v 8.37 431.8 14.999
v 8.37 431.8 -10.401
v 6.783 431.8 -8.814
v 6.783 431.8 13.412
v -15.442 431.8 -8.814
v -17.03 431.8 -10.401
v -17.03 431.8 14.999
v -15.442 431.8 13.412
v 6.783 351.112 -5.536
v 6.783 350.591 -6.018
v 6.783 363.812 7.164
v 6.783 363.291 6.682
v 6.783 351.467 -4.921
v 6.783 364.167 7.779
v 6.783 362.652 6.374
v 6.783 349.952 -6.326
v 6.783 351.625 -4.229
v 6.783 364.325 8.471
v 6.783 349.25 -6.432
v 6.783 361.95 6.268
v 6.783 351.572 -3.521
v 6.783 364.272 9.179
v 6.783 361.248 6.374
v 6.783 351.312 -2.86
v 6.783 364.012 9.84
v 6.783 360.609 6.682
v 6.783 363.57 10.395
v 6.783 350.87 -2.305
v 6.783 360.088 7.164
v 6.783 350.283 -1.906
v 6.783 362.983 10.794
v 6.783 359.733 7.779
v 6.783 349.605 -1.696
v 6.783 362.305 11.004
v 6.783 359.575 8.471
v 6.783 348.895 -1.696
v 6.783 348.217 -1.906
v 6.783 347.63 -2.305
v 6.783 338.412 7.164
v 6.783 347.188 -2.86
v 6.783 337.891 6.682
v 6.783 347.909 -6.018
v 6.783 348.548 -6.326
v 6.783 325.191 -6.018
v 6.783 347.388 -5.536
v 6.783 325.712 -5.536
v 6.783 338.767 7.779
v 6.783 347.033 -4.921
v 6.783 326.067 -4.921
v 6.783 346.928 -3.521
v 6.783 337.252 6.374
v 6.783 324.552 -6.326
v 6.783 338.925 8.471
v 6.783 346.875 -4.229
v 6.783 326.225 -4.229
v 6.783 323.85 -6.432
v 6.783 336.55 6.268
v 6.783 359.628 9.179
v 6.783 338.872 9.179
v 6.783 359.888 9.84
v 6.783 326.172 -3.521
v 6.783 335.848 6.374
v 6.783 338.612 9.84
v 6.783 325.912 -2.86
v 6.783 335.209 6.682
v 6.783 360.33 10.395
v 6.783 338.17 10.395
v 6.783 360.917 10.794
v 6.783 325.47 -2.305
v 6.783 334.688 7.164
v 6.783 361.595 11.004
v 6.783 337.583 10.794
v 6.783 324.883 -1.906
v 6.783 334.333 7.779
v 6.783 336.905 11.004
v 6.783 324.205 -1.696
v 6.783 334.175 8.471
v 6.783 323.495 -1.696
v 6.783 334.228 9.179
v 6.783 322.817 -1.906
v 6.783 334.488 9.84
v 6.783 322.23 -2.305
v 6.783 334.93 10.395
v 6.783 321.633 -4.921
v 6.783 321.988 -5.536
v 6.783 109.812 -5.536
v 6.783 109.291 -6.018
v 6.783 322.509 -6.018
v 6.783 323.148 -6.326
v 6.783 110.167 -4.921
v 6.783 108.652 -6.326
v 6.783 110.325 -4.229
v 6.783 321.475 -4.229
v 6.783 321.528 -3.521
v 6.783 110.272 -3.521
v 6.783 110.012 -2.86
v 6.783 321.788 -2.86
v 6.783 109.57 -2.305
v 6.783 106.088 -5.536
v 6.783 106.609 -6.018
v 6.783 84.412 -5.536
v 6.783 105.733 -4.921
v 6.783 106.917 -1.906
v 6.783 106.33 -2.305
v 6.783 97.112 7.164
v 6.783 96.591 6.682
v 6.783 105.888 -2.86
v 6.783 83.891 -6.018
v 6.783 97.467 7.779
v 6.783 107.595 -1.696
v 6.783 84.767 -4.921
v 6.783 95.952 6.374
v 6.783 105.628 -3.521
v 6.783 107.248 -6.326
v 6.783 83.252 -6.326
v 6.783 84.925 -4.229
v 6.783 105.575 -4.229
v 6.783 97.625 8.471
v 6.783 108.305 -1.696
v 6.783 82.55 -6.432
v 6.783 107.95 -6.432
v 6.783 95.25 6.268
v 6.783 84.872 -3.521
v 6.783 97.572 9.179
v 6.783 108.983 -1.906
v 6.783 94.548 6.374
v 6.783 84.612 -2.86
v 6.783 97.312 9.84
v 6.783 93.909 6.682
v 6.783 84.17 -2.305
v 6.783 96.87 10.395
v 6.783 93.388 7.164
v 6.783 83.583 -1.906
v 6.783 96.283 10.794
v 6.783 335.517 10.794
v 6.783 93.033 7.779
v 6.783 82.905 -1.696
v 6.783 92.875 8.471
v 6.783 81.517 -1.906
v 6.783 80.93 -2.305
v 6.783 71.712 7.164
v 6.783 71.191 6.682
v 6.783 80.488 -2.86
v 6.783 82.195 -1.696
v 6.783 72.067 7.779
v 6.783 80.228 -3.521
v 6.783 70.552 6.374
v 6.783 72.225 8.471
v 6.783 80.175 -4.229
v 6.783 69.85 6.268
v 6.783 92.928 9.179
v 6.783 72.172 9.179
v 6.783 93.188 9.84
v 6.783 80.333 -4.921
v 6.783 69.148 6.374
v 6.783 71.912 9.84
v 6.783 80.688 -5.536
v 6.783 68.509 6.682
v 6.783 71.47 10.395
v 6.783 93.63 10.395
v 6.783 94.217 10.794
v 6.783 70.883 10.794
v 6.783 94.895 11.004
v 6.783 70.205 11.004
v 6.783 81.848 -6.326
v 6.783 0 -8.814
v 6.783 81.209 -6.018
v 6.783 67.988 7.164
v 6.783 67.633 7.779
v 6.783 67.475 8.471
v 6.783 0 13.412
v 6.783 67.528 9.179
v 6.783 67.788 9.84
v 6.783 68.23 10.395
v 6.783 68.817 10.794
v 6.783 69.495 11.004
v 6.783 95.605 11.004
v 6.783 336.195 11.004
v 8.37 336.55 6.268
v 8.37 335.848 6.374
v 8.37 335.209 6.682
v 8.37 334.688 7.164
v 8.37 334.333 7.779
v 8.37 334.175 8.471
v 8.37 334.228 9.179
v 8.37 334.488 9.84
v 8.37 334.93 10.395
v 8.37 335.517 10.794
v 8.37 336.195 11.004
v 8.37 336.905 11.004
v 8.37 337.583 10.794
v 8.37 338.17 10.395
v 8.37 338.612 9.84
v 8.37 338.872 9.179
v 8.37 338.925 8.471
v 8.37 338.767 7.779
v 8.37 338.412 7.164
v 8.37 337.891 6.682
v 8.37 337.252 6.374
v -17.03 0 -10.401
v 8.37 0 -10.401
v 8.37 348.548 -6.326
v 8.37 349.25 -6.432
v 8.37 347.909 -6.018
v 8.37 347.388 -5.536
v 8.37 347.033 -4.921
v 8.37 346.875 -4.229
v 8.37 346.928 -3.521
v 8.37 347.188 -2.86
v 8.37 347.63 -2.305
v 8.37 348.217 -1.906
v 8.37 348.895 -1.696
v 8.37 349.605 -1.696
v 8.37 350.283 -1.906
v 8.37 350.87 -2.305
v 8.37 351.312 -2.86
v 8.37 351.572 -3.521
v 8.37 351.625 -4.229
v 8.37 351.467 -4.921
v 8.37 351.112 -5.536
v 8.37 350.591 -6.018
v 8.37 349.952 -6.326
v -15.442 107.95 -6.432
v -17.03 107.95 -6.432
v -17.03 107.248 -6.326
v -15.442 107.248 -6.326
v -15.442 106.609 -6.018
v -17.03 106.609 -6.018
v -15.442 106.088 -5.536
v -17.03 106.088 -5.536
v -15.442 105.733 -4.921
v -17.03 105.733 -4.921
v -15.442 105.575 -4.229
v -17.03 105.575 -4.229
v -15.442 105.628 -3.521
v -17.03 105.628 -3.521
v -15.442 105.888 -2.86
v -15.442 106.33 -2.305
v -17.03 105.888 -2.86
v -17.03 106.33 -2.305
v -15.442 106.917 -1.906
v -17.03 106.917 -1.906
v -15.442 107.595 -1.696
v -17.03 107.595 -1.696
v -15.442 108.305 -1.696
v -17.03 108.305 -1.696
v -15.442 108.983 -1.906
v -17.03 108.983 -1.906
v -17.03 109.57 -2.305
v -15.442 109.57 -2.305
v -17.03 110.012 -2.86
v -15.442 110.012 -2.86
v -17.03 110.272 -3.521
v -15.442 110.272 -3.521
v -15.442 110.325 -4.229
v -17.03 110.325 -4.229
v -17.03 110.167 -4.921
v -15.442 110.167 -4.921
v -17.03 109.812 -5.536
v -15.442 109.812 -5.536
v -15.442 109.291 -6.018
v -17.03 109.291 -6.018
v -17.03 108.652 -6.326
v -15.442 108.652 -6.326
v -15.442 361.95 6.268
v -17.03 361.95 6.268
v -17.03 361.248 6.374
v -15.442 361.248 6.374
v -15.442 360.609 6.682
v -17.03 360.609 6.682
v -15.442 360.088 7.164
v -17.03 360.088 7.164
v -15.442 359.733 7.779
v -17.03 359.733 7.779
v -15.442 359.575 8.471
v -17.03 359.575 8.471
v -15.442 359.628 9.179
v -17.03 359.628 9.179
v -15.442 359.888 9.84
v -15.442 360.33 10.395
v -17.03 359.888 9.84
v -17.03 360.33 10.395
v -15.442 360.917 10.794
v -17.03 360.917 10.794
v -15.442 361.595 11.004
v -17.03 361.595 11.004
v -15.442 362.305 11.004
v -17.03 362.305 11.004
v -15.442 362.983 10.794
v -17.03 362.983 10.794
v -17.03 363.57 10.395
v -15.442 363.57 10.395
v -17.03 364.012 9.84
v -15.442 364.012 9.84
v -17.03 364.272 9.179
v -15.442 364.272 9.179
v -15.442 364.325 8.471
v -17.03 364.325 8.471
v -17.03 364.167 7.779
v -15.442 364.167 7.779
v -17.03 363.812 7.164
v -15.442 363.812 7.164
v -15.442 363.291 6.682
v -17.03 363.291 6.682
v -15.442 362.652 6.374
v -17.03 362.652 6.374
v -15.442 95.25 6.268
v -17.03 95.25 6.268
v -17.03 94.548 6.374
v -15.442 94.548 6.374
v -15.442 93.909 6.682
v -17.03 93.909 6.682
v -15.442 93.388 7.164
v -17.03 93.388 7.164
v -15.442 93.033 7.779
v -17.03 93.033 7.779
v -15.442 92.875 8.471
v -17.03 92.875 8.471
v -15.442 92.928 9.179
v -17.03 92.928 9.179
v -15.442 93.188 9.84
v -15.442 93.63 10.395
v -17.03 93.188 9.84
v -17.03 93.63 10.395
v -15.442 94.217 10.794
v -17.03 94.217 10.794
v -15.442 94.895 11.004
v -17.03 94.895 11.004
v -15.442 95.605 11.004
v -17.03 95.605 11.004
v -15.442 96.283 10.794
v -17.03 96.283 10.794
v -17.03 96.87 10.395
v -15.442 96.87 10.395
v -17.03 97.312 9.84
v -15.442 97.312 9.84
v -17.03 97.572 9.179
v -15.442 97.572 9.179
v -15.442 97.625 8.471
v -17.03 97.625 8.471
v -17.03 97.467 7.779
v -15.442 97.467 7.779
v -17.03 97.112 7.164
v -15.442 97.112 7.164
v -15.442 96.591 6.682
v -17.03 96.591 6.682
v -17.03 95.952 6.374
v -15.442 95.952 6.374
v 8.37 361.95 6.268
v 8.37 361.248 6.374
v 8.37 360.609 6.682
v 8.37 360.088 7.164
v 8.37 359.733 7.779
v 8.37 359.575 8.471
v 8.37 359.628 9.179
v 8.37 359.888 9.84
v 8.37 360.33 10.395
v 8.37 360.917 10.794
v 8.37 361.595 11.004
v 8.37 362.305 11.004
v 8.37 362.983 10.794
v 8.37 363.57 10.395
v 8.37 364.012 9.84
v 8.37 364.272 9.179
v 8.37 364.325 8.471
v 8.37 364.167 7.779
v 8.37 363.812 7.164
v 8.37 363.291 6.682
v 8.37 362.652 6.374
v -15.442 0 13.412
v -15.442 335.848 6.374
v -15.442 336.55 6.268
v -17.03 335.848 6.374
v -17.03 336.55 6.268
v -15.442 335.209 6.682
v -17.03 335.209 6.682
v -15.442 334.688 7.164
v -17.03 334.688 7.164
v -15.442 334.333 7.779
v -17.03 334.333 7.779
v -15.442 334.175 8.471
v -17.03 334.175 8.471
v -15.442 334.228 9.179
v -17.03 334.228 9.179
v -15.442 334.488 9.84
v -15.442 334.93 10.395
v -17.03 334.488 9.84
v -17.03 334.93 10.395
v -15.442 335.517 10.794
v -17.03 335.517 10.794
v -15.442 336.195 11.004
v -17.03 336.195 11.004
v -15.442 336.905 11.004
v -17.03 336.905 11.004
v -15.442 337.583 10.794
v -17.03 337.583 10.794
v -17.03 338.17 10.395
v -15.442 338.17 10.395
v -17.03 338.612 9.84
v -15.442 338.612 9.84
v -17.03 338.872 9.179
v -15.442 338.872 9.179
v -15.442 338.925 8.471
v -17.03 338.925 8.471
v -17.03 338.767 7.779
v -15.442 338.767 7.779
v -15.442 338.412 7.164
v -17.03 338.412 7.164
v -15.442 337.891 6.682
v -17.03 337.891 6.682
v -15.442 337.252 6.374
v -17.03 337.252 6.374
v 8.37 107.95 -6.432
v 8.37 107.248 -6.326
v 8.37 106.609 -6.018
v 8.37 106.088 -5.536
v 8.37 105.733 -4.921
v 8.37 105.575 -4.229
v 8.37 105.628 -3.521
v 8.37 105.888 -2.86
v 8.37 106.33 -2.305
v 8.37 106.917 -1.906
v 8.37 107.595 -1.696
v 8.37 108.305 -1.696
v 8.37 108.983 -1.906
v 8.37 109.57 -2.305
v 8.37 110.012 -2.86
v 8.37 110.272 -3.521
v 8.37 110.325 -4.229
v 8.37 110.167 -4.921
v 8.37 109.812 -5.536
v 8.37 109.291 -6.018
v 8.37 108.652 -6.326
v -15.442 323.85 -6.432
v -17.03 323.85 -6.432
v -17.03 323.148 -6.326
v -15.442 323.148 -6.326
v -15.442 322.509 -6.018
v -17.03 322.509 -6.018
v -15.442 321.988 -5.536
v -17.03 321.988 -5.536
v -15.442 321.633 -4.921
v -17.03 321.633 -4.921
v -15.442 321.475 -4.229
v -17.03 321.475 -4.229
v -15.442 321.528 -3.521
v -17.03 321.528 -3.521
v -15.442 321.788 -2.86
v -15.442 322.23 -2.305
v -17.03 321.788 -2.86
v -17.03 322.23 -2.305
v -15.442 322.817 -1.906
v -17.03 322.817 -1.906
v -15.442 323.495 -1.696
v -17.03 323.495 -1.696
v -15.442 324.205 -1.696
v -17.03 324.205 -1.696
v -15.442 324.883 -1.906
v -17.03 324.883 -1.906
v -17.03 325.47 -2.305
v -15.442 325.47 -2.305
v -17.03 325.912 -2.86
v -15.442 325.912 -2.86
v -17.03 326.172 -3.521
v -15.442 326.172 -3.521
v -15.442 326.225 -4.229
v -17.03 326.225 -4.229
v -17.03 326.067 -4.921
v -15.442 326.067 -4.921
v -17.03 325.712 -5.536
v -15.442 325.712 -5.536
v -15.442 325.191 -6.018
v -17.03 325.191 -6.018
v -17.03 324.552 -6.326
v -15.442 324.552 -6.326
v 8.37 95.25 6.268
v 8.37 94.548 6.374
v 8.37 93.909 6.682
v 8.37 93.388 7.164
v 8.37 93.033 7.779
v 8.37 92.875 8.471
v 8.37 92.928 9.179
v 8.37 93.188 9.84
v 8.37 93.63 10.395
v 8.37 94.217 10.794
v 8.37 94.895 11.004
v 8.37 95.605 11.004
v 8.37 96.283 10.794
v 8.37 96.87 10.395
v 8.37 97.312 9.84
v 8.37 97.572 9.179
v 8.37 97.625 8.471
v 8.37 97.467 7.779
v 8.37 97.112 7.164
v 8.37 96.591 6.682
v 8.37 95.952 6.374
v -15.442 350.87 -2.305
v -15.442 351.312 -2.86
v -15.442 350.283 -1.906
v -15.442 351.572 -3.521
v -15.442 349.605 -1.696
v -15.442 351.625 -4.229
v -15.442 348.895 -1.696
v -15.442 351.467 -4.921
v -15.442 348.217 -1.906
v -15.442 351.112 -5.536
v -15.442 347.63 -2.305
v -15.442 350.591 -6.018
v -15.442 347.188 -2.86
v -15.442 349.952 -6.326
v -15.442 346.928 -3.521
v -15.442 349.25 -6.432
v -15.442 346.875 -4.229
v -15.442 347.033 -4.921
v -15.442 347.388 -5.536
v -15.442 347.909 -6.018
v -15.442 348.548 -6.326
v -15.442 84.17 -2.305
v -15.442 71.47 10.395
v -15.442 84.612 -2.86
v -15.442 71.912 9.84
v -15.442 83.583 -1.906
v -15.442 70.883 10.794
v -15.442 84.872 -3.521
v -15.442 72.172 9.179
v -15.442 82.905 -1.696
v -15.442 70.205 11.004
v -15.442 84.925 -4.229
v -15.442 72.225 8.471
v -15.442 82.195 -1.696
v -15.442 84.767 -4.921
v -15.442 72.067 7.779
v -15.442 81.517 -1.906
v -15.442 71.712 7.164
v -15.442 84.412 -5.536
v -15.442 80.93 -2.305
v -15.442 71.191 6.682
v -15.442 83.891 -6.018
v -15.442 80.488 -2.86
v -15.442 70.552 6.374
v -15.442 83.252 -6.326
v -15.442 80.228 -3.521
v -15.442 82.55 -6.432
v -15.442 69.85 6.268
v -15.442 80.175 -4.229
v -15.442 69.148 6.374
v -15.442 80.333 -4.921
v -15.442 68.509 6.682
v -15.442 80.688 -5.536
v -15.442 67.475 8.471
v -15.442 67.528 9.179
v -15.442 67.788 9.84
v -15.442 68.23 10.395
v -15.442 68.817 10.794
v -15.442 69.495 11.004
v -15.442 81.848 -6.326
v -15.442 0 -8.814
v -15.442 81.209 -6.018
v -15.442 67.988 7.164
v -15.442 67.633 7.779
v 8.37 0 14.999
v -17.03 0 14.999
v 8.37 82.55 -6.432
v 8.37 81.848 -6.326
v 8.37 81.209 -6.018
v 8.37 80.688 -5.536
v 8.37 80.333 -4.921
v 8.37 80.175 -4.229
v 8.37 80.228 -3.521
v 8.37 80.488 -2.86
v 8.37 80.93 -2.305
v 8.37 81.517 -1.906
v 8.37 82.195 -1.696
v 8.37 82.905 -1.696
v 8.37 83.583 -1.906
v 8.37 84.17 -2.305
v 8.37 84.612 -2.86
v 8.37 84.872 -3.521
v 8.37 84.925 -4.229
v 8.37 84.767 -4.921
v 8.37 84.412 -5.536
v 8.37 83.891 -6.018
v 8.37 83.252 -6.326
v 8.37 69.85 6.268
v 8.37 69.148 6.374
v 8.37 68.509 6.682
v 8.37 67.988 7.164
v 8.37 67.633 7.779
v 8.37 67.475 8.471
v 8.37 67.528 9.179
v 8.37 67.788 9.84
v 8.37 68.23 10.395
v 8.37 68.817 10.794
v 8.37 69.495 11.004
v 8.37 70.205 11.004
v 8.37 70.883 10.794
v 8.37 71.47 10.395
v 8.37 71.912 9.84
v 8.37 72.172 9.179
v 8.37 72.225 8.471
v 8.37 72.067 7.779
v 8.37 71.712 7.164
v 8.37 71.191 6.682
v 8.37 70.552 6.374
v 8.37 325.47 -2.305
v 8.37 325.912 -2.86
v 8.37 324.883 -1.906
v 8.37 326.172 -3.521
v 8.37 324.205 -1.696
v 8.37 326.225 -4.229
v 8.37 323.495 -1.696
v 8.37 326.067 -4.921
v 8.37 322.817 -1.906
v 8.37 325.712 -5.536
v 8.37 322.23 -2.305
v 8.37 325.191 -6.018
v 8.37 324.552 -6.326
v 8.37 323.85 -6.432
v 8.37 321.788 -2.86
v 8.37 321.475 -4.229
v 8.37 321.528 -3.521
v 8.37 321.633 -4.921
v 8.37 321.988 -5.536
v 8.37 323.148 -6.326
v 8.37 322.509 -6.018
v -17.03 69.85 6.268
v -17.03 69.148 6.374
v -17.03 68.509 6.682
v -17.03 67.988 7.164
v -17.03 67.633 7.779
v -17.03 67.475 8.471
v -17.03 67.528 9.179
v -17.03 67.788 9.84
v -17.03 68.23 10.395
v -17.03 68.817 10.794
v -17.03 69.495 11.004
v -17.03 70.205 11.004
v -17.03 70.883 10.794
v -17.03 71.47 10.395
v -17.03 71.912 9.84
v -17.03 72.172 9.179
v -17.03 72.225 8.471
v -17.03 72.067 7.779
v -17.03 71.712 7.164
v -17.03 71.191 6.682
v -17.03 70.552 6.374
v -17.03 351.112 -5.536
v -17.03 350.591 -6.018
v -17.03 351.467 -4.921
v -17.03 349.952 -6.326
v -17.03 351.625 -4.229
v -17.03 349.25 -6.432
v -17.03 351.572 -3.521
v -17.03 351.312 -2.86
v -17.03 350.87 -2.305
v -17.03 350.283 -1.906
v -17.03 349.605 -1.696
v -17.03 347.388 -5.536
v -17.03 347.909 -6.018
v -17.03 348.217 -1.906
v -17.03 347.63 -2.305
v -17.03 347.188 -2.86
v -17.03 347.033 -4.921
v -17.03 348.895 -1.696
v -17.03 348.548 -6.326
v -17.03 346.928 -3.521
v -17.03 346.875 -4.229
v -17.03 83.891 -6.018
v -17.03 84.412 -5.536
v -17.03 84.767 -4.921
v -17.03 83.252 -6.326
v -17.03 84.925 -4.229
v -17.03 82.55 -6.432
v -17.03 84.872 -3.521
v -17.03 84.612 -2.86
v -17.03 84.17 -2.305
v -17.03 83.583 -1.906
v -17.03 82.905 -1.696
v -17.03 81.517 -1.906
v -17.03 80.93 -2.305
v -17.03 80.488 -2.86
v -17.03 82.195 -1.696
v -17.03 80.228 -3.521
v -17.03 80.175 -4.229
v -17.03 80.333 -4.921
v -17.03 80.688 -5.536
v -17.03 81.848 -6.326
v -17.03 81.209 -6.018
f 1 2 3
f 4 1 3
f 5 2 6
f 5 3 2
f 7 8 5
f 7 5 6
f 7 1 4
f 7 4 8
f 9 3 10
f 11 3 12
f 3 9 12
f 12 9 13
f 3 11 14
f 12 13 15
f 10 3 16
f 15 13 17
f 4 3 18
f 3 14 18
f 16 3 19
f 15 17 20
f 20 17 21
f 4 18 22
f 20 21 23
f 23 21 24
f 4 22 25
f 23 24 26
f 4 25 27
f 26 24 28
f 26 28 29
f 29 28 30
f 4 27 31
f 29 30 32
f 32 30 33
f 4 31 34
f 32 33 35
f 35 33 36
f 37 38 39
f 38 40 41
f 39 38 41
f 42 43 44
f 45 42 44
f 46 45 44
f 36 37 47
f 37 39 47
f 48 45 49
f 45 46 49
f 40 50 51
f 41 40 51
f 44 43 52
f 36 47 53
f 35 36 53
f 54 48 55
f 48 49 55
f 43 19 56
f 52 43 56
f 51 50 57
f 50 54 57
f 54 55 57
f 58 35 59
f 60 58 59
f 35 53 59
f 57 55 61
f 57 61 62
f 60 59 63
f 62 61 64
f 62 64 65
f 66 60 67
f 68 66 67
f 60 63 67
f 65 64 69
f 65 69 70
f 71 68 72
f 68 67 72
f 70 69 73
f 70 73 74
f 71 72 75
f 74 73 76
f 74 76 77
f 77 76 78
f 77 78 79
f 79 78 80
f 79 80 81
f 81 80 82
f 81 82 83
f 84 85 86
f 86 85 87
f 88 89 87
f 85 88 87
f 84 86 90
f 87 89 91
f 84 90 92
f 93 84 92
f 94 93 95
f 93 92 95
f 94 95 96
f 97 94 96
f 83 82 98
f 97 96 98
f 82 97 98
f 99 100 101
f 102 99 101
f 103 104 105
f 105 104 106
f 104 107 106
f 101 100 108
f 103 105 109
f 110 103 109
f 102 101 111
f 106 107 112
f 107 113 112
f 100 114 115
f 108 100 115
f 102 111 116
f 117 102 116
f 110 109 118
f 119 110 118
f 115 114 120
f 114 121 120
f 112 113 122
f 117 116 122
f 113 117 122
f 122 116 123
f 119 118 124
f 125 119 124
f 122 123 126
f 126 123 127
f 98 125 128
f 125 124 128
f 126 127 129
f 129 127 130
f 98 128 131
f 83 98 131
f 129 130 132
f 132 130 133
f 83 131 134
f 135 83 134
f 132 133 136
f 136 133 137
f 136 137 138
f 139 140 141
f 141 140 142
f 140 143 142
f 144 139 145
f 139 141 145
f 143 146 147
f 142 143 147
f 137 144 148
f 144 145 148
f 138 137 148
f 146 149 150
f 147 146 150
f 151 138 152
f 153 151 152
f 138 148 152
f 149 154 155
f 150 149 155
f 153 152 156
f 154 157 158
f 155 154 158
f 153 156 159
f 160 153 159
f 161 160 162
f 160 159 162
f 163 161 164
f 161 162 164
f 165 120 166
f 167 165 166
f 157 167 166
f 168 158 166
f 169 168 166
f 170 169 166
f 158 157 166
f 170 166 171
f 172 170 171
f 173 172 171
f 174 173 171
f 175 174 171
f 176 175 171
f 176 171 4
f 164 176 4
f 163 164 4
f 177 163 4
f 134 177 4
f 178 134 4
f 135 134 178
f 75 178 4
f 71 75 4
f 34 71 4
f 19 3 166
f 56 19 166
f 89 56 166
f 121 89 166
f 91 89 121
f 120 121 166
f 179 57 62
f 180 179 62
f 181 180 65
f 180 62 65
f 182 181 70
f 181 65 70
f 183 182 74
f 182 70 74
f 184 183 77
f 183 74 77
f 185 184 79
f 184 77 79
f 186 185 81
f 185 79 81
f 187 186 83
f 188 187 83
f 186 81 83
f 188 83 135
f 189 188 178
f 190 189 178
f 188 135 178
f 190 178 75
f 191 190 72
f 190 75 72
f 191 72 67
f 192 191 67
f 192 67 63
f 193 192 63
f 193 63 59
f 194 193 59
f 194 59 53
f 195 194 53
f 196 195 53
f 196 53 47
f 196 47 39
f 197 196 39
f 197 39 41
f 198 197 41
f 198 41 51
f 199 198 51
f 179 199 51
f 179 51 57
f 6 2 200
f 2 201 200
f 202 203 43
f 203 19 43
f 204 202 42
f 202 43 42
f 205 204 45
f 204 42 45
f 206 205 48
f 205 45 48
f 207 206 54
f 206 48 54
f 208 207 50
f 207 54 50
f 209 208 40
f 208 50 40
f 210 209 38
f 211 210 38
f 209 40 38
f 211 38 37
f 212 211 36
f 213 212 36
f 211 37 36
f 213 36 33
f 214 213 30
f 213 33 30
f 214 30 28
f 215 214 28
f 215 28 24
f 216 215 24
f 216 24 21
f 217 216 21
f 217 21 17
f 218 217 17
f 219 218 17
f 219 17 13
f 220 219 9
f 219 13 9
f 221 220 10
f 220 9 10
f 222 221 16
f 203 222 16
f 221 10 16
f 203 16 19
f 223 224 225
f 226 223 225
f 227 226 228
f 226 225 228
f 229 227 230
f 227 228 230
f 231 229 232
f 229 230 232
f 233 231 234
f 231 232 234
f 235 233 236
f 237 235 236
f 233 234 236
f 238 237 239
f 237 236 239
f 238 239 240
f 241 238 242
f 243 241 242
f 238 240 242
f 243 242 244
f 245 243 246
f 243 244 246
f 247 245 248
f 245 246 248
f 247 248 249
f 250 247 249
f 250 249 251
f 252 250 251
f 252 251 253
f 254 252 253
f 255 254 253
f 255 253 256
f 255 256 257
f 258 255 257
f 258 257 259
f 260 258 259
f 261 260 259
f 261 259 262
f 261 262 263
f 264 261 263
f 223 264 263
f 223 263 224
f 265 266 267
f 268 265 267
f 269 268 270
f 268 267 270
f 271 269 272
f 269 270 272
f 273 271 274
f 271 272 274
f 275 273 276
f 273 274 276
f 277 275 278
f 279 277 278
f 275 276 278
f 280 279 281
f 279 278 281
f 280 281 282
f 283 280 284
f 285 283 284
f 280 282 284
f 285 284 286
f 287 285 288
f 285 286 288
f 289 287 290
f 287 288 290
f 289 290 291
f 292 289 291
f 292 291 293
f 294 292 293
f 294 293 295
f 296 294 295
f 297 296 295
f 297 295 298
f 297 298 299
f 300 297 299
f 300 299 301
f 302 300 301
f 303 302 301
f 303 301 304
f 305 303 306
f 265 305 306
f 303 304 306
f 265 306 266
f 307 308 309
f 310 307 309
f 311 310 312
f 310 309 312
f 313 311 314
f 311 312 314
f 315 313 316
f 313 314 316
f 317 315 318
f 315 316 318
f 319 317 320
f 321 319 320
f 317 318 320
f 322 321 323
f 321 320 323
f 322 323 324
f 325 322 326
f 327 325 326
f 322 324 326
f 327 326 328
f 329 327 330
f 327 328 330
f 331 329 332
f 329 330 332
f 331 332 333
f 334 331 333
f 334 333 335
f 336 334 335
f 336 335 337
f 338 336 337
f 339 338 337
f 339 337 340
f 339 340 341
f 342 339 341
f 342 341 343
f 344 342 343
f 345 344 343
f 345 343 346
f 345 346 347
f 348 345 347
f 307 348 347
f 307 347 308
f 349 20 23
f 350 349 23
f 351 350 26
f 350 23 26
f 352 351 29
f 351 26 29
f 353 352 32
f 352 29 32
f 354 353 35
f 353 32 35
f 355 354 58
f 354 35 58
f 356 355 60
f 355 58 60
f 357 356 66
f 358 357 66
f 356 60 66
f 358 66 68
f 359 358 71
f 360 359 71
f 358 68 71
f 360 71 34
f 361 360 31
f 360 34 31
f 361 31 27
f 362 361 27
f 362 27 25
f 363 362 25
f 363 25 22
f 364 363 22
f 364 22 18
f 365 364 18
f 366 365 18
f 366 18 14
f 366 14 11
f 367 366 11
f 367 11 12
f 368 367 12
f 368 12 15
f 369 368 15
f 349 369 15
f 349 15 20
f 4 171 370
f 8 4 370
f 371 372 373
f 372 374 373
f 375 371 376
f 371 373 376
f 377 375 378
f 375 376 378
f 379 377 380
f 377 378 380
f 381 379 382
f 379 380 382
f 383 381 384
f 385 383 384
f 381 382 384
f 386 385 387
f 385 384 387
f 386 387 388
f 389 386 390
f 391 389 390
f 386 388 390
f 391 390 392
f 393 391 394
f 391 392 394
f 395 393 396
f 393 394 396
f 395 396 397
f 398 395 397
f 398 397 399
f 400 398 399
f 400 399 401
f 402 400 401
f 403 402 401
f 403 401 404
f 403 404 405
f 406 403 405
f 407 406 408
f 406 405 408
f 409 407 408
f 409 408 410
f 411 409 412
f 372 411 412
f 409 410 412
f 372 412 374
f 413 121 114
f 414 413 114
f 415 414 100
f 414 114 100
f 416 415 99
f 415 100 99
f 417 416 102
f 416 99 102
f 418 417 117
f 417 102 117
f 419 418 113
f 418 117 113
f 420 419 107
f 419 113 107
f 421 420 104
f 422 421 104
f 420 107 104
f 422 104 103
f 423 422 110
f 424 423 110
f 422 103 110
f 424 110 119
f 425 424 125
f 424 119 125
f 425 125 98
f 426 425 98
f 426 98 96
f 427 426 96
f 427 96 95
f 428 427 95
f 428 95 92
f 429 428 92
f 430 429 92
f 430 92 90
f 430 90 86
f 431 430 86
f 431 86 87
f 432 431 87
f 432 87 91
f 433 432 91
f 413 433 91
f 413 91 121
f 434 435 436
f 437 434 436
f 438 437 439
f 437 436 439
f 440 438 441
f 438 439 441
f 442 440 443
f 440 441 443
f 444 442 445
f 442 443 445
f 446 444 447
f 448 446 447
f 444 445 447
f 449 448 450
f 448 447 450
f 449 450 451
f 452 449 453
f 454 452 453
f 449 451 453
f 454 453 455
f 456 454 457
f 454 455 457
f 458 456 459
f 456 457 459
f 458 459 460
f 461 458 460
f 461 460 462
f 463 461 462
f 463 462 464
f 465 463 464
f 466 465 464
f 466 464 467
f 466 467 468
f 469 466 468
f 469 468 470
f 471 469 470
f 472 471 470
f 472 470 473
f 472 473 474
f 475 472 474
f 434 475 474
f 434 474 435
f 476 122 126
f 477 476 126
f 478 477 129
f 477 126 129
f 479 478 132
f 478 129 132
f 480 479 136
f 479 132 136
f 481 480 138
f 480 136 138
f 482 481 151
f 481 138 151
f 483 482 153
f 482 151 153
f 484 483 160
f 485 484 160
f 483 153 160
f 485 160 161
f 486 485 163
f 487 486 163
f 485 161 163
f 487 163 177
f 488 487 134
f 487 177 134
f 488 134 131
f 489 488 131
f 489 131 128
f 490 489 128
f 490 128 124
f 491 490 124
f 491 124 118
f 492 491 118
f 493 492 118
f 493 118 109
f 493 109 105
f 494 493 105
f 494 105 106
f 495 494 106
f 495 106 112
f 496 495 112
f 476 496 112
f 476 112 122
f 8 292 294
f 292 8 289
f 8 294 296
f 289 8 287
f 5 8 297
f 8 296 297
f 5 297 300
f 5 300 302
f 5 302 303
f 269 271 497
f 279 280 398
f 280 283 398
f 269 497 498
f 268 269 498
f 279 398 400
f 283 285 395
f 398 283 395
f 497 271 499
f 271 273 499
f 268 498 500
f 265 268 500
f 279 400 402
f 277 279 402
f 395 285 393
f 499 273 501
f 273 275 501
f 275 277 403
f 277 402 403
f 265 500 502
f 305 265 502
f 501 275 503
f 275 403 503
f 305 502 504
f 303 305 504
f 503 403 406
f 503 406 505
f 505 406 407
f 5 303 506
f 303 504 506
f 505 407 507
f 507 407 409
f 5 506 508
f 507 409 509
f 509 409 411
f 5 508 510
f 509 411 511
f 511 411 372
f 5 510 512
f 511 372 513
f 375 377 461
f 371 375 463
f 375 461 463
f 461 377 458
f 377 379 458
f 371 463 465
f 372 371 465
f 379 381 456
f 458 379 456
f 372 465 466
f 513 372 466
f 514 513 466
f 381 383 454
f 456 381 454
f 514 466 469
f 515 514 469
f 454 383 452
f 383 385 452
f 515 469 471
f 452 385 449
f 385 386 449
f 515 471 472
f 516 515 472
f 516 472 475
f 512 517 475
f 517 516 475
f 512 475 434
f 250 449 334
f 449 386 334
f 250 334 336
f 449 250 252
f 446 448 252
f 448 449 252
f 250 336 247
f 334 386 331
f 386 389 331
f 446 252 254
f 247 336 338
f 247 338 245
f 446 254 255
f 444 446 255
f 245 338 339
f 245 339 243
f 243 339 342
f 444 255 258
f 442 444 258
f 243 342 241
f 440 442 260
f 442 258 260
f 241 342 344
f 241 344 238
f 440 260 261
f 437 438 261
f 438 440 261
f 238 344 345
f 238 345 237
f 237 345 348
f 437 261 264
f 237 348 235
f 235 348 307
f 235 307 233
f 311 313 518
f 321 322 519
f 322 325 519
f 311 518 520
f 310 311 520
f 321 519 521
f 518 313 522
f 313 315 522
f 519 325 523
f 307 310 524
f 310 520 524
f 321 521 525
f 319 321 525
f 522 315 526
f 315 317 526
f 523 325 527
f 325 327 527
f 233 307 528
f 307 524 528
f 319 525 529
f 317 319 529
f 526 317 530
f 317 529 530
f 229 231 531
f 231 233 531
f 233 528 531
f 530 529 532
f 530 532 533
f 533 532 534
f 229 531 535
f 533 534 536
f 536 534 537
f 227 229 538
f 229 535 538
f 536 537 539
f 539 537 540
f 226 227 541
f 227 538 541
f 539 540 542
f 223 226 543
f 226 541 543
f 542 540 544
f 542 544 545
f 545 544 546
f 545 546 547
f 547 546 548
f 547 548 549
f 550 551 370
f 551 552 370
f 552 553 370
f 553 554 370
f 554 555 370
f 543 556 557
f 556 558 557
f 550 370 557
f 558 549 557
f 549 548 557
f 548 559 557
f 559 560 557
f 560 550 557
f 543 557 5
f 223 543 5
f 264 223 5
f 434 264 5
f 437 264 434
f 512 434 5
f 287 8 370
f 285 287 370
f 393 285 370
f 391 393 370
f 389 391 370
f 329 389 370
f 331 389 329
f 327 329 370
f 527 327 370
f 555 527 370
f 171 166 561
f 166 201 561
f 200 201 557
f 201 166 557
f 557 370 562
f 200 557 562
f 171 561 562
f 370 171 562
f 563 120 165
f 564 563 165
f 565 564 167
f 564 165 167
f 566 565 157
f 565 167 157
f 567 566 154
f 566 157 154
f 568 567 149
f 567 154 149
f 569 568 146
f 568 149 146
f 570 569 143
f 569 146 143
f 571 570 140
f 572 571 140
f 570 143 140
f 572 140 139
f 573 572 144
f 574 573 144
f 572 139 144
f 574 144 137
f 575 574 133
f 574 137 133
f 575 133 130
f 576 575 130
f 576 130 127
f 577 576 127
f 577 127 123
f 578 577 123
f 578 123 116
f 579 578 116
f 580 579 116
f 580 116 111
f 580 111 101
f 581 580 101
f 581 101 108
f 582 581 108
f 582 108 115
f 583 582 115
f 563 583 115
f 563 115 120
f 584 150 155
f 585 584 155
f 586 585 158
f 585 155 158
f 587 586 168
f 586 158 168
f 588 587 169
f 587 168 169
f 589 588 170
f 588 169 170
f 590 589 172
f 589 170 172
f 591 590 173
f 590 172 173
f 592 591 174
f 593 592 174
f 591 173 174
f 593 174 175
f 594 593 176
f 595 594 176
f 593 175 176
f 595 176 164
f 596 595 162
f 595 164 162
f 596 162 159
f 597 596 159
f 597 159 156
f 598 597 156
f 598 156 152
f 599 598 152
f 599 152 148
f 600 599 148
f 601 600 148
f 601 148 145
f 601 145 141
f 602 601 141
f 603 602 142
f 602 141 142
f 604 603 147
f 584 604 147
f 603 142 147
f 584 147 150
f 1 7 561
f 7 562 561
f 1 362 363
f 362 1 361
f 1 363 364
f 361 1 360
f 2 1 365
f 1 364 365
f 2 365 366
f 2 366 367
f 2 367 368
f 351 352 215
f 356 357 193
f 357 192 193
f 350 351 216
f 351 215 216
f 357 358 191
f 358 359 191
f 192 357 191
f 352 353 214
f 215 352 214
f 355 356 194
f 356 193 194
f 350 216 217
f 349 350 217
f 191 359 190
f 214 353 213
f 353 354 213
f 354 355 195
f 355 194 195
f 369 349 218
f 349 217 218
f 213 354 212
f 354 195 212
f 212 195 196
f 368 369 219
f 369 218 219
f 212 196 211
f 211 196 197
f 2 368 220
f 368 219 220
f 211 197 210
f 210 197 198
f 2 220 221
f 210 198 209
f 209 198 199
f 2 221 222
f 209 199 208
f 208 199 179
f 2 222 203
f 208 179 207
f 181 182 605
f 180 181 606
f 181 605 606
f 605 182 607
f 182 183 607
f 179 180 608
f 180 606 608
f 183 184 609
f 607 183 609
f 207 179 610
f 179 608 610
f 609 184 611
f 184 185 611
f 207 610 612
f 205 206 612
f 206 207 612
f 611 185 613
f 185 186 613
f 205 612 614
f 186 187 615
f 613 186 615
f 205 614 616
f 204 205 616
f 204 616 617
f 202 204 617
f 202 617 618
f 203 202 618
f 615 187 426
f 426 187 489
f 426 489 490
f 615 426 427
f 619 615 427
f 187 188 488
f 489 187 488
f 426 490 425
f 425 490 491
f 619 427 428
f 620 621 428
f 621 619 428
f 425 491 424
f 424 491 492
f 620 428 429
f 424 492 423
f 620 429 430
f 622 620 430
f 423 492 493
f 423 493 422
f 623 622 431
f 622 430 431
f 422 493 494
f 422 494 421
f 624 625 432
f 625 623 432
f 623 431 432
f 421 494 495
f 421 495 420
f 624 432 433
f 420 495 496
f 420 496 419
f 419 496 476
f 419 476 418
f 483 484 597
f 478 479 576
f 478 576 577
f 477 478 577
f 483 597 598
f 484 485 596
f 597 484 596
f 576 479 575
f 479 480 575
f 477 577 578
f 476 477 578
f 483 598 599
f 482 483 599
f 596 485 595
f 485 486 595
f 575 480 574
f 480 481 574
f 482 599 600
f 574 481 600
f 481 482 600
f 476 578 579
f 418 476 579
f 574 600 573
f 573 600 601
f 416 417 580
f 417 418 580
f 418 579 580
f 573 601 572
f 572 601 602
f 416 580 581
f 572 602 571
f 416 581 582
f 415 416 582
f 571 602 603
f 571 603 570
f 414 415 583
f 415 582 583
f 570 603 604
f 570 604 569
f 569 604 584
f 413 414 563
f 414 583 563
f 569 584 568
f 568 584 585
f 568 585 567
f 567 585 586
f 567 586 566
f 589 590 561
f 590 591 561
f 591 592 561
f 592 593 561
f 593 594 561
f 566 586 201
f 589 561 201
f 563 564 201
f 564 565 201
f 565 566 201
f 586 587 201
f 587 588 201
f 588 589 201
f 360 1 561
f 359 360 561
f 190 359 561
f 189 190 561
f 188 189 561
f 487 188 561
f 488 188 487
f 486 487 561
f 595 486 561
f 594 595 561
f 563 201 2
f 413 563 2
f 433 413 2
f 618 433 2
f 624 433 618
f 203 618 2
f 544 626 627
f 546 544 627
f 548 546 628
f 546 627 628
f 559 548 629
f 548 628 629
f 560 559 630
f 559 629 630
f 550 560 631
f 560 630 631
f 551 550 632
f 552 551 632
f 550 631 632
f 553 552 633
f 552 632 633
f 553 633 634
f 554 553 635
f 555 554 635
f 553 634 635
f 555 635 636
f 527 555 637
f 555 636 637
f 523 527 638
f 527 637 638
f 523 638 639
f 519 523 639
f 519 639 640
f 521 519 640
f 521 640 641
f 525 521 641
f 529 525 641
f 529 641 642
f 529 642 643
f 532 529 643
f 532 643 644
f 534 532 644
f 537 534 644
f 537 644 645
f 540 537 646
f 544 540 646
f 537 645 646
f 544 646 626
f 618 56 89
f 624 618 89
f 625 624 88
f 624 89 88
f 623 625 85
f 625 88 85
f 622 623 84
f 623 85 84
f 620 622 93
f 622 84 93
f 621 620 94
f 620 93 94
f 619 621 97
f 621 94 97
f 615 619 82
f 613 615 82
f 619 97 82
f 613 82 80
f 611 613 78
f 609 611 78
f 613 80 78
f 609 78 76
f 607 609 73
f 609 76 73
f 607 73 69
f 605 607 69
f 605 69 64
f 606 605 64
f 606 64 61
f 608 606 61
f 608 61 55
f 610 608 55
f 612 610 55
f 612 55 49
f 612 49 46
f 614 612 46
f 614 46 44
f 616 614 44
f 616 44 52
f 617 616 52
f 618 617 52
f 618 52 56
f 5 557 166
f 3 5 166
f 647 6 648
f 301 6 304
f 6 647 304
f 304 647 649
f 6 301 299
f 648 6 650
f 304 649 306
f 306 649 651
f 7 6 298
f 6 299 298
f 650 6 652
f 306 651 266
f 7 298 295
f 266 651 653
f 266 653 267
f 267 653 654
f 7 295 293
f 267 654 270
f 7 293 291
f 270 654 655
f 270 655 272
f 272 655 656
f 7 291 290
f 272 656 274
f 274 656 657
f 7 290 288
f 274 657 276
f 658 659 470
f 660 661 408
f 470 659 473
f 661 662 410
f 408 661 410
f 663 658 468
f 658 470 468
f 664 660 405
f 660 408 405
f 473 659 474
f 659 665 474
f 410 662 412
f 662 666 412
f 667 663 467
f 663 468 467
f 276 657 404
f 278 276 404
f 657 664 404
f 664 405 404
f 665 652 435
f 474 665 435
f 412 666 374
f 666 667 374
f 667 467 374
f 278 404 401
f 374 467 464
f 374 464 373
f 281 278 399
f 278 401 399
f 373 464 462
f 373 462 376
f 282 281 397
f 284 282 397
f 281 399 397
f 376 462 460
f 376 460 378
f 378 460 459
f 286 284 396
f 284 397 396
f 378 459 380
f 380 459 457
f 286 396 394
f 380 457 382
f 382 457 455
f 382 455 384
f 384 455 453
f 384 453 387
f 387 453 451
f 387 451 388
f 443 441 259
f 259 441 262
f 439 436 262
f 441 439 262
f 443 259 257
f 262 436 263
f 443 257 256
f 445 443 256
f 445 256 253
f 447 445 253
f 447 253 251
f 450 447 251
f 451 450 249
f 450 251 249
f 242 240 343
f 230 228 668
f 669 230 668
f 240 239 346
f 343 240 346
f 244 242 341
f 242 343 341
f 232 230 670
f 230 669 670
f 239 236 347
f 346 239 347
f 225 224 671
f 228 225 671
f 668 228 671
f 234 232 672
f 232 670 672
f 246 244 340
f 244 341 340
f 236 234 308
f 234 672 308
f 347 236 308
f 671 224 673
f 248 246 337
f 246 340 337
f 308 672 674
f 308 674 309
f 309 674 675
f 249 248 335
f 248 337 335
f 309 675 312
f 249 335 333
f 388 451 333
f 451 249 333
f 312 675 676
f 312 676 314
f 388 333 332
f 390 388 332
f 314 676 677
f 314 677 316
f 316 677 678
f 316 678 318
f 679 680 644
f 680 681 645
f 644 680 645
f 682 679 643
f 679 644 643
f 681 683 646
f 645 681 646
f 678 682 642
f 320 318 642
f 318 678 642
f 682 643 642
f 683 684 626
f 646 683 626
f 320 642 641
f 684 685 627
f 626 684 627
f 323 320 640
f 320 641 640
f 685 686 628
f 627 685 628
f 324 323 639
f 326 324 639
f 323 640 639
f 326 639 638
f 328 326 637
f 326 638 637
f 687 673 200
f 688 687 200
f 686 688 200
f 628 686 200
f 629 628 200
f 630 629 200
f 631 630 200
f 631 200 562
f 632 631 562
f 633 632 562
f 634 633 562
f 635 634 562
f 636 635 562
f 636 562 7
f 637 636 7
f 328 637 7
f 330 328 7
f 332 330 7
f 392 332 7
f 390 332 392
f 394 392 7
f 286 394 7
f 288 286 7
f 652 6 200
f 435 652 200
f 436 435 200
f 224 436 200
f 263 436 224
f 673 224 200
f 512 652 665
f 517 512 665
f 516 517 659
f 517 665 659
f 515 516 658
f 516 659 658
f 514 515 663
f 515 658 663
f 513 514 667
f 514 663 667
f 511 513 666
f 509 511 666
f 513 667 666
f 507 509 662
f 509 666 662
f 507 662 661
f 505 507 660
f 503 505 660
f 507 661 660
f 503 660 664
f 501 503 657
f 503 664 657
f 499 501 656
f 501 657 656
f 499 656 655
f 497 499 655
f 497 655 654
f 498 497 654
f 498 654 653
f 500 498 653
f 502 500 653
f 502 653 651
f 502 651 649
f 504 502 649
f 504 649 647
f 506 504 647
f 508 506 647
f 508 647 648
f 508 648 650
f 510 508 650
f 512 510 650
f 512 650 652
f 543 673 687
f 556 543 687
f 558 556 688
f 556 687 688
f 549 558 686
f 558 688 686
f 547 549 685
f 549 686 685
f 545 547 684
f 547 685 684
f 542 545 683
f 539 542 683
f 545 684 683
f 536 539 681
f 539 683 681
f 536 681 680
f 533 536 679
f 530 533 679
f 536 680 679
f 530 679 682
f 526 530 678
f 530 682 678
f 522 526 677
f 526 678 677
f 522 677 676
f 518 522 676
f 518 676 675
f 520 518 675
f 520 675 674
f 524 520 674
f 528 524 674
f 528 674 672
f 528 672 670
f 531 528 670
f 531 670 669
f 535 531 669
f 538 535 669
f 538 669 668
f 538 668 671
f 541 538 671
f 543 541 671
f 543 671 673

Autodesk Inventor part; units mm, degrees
ref_plane "YZ Plane" through (0, 0, 0) normal (1, 0, 0) x (0, 1, 0)
ref_plane "XZ Plane" through (0, 0, 0) normal (0, 1, 0) x (-1, 0, 0)
ref_plane "XY Plane" through (0, 0, 0) normal (0, 0, 1) x (1, 0, 0)
sketch "Sketch1" plane through (0, 0, 0) normal (0, 1, 0) x (-1, 0, 0)
  line L0 (17.0295, 14.999) -> (-8.3705, 14.999)
  line L1 (-8.3705, 14.999) -> (-8.3705, -10.401)
  line L2 (-8.3705, -10.401) -> (17.0295, -10.401)
  line L3 (17.0295, -10.401) -> (17.0295, 14.999)
  line L4 (15.442, -8.8135) -> (-6.783, -8.8135)
  line L5 (-6.783, -8.8135) -> (-6.783, 13.4115)
  line L6 (-6.783, 13.4115) -> (15.442, 13.4115)
  line L7 (15.442, 13.4115) -> (15.442, -8.8135)
  point P0 (0, 0)
  dimension "d0" = 25.4
  dimension "d1" = 25.4
  dimension "d4" = 1.5875
  dimension "d5" = 1.5875
  dimension "d6" = 1.5875
  dimension "d7" = 1.5875
extrude "Extrusion2" add sketch "Sketch1" along normal blind 431.8
sketch "Sketch3" plane through (8.3705, 0, 14.999) normal (1, 0, 0) x (0, 0, -1)
  line L0 (25.4, 0) -> (25.4, 431.8) projected
  line L1 (0, 431.8) -> (25.4, 431.8) projected
  line L2 (0, 0) -> (25.4, 0) projected
  point P0 (14.999, 0)
  point P1 (19.05, 349.25)
  point P2 (19.05, 82.55)
  dimension "d19" = 6.35
  dimension "d20" = 82.55
  dimension "d21" = 6.35
  dimension "d22" = 82.55
hole "Hole2" at (8.3705, 349.25, -4.051) at (8.3705, 82.55, -4.051) direction (-1, 0, 0) diameter 4.7625 depth 25.4 tip angle 118.188
sketch "Sketch4" plane through (8.3705, 0, 14.999) normal (1, 0, 0) x (0, 0, -1)
  line L0 (25.4, 0) -> (25.4, 431.8) projected
  circle A0 centre (19.05, 82.55) radius 2.3813 projected
  line L1 (0, 0) -> (0, 431.8) projected
  circle A1 centre (19.05, 349.25) radius 2.3813 projected
  point P0 (14.999, 0)
  point P1 (19.05, 107.95)
  point P2 (6.35, 69.85)
  point P3 (6.35, 95.25)
  point P4 (19.05, 323.85)
  point P5 (6.35, 361.95)
  point P6 (6.35, 336.55)
  dimension "d30" = 6.35
  dimension "d31" = 25.4
  dimension "d32" = 6.35
  dimension "d33" = 6.35
  dimension "d34" = 25.4
  dimension "d36" = 6.35
  dimension "d37" = 25.4
  dimension "d38" = 6.35
  dimension "d39" = 6.35
  dimension "d40" = 25.4
  dimension "d49" = 12.7
  dimension "d50" = 12.7
hole "Hole3" at (8.3705, 107.95, -4.051) at (8.3705, 69.85, 8.649) at (8.3705, 95.25, 8.649) at (8.3705, 323.85, -4.051) at (8.3705, 361.95, 8.649) at (8.3705, 336.55, 8.649) direction (-1, 0, 0) diameter 4.7625 depth 25.4 tip angle 118.188
equation "\"d0\" = ElvBeamWidth"
equation "\"d1\" = ElvBeamWidth"
equation "\"d4\" = ElvWallWidth"
equation "\"d5\" = ElvWallWidth"
equation "\"d6\" = ElvWallWidth"
equation "\"d7\" = ElvWallWidth"
equation "\"d8\" = ElvEndEffectLength"
equation "\"ElvMiddleBeamLength\" = 990.6"
equation "\"ElvWallWidth\" = 1.5875"
equation "\"ElvFrontBeamLength\" = 990.6"
equation "\"ElvEndEffectLength\" = 431.8"
equation "\"ElvCrossBeamLength\" = 304.8"
equation "\"ElvBeamWidth\" = 25.4"
equation "\"ElvFrontBeamLength_1\" = 1066.8"
equation "\"ElvFixedBeamLength\" = 990.6"
equation "\"ElvDelHeight\" = 101.6"
equation "\"ElvDelFrontTabLength\" = 6.35"
equation "\"ElvDelWidth\" = 18.542"
equation "\"ElvDelDepth\" = 6.35"
equation "\"ElvTopBeamLength\" = 457.2"
equation "\"ElvHoleFromFixed\" = 50.8"
equation "\"ElvHoleFromMid\" = 38.1"
equation "\"ElvHoleFromFront\" = 25.4"
equation "\"ElvHoleFromBottom\" = 38.1"
equation "\"ElvRivetPlateLength\" = 76.2"
equation "\"ElvDelMiddleTabLength\" = 6.35"
properties part number "ElvEndEffectBeam" material "Aluminum 6061"
